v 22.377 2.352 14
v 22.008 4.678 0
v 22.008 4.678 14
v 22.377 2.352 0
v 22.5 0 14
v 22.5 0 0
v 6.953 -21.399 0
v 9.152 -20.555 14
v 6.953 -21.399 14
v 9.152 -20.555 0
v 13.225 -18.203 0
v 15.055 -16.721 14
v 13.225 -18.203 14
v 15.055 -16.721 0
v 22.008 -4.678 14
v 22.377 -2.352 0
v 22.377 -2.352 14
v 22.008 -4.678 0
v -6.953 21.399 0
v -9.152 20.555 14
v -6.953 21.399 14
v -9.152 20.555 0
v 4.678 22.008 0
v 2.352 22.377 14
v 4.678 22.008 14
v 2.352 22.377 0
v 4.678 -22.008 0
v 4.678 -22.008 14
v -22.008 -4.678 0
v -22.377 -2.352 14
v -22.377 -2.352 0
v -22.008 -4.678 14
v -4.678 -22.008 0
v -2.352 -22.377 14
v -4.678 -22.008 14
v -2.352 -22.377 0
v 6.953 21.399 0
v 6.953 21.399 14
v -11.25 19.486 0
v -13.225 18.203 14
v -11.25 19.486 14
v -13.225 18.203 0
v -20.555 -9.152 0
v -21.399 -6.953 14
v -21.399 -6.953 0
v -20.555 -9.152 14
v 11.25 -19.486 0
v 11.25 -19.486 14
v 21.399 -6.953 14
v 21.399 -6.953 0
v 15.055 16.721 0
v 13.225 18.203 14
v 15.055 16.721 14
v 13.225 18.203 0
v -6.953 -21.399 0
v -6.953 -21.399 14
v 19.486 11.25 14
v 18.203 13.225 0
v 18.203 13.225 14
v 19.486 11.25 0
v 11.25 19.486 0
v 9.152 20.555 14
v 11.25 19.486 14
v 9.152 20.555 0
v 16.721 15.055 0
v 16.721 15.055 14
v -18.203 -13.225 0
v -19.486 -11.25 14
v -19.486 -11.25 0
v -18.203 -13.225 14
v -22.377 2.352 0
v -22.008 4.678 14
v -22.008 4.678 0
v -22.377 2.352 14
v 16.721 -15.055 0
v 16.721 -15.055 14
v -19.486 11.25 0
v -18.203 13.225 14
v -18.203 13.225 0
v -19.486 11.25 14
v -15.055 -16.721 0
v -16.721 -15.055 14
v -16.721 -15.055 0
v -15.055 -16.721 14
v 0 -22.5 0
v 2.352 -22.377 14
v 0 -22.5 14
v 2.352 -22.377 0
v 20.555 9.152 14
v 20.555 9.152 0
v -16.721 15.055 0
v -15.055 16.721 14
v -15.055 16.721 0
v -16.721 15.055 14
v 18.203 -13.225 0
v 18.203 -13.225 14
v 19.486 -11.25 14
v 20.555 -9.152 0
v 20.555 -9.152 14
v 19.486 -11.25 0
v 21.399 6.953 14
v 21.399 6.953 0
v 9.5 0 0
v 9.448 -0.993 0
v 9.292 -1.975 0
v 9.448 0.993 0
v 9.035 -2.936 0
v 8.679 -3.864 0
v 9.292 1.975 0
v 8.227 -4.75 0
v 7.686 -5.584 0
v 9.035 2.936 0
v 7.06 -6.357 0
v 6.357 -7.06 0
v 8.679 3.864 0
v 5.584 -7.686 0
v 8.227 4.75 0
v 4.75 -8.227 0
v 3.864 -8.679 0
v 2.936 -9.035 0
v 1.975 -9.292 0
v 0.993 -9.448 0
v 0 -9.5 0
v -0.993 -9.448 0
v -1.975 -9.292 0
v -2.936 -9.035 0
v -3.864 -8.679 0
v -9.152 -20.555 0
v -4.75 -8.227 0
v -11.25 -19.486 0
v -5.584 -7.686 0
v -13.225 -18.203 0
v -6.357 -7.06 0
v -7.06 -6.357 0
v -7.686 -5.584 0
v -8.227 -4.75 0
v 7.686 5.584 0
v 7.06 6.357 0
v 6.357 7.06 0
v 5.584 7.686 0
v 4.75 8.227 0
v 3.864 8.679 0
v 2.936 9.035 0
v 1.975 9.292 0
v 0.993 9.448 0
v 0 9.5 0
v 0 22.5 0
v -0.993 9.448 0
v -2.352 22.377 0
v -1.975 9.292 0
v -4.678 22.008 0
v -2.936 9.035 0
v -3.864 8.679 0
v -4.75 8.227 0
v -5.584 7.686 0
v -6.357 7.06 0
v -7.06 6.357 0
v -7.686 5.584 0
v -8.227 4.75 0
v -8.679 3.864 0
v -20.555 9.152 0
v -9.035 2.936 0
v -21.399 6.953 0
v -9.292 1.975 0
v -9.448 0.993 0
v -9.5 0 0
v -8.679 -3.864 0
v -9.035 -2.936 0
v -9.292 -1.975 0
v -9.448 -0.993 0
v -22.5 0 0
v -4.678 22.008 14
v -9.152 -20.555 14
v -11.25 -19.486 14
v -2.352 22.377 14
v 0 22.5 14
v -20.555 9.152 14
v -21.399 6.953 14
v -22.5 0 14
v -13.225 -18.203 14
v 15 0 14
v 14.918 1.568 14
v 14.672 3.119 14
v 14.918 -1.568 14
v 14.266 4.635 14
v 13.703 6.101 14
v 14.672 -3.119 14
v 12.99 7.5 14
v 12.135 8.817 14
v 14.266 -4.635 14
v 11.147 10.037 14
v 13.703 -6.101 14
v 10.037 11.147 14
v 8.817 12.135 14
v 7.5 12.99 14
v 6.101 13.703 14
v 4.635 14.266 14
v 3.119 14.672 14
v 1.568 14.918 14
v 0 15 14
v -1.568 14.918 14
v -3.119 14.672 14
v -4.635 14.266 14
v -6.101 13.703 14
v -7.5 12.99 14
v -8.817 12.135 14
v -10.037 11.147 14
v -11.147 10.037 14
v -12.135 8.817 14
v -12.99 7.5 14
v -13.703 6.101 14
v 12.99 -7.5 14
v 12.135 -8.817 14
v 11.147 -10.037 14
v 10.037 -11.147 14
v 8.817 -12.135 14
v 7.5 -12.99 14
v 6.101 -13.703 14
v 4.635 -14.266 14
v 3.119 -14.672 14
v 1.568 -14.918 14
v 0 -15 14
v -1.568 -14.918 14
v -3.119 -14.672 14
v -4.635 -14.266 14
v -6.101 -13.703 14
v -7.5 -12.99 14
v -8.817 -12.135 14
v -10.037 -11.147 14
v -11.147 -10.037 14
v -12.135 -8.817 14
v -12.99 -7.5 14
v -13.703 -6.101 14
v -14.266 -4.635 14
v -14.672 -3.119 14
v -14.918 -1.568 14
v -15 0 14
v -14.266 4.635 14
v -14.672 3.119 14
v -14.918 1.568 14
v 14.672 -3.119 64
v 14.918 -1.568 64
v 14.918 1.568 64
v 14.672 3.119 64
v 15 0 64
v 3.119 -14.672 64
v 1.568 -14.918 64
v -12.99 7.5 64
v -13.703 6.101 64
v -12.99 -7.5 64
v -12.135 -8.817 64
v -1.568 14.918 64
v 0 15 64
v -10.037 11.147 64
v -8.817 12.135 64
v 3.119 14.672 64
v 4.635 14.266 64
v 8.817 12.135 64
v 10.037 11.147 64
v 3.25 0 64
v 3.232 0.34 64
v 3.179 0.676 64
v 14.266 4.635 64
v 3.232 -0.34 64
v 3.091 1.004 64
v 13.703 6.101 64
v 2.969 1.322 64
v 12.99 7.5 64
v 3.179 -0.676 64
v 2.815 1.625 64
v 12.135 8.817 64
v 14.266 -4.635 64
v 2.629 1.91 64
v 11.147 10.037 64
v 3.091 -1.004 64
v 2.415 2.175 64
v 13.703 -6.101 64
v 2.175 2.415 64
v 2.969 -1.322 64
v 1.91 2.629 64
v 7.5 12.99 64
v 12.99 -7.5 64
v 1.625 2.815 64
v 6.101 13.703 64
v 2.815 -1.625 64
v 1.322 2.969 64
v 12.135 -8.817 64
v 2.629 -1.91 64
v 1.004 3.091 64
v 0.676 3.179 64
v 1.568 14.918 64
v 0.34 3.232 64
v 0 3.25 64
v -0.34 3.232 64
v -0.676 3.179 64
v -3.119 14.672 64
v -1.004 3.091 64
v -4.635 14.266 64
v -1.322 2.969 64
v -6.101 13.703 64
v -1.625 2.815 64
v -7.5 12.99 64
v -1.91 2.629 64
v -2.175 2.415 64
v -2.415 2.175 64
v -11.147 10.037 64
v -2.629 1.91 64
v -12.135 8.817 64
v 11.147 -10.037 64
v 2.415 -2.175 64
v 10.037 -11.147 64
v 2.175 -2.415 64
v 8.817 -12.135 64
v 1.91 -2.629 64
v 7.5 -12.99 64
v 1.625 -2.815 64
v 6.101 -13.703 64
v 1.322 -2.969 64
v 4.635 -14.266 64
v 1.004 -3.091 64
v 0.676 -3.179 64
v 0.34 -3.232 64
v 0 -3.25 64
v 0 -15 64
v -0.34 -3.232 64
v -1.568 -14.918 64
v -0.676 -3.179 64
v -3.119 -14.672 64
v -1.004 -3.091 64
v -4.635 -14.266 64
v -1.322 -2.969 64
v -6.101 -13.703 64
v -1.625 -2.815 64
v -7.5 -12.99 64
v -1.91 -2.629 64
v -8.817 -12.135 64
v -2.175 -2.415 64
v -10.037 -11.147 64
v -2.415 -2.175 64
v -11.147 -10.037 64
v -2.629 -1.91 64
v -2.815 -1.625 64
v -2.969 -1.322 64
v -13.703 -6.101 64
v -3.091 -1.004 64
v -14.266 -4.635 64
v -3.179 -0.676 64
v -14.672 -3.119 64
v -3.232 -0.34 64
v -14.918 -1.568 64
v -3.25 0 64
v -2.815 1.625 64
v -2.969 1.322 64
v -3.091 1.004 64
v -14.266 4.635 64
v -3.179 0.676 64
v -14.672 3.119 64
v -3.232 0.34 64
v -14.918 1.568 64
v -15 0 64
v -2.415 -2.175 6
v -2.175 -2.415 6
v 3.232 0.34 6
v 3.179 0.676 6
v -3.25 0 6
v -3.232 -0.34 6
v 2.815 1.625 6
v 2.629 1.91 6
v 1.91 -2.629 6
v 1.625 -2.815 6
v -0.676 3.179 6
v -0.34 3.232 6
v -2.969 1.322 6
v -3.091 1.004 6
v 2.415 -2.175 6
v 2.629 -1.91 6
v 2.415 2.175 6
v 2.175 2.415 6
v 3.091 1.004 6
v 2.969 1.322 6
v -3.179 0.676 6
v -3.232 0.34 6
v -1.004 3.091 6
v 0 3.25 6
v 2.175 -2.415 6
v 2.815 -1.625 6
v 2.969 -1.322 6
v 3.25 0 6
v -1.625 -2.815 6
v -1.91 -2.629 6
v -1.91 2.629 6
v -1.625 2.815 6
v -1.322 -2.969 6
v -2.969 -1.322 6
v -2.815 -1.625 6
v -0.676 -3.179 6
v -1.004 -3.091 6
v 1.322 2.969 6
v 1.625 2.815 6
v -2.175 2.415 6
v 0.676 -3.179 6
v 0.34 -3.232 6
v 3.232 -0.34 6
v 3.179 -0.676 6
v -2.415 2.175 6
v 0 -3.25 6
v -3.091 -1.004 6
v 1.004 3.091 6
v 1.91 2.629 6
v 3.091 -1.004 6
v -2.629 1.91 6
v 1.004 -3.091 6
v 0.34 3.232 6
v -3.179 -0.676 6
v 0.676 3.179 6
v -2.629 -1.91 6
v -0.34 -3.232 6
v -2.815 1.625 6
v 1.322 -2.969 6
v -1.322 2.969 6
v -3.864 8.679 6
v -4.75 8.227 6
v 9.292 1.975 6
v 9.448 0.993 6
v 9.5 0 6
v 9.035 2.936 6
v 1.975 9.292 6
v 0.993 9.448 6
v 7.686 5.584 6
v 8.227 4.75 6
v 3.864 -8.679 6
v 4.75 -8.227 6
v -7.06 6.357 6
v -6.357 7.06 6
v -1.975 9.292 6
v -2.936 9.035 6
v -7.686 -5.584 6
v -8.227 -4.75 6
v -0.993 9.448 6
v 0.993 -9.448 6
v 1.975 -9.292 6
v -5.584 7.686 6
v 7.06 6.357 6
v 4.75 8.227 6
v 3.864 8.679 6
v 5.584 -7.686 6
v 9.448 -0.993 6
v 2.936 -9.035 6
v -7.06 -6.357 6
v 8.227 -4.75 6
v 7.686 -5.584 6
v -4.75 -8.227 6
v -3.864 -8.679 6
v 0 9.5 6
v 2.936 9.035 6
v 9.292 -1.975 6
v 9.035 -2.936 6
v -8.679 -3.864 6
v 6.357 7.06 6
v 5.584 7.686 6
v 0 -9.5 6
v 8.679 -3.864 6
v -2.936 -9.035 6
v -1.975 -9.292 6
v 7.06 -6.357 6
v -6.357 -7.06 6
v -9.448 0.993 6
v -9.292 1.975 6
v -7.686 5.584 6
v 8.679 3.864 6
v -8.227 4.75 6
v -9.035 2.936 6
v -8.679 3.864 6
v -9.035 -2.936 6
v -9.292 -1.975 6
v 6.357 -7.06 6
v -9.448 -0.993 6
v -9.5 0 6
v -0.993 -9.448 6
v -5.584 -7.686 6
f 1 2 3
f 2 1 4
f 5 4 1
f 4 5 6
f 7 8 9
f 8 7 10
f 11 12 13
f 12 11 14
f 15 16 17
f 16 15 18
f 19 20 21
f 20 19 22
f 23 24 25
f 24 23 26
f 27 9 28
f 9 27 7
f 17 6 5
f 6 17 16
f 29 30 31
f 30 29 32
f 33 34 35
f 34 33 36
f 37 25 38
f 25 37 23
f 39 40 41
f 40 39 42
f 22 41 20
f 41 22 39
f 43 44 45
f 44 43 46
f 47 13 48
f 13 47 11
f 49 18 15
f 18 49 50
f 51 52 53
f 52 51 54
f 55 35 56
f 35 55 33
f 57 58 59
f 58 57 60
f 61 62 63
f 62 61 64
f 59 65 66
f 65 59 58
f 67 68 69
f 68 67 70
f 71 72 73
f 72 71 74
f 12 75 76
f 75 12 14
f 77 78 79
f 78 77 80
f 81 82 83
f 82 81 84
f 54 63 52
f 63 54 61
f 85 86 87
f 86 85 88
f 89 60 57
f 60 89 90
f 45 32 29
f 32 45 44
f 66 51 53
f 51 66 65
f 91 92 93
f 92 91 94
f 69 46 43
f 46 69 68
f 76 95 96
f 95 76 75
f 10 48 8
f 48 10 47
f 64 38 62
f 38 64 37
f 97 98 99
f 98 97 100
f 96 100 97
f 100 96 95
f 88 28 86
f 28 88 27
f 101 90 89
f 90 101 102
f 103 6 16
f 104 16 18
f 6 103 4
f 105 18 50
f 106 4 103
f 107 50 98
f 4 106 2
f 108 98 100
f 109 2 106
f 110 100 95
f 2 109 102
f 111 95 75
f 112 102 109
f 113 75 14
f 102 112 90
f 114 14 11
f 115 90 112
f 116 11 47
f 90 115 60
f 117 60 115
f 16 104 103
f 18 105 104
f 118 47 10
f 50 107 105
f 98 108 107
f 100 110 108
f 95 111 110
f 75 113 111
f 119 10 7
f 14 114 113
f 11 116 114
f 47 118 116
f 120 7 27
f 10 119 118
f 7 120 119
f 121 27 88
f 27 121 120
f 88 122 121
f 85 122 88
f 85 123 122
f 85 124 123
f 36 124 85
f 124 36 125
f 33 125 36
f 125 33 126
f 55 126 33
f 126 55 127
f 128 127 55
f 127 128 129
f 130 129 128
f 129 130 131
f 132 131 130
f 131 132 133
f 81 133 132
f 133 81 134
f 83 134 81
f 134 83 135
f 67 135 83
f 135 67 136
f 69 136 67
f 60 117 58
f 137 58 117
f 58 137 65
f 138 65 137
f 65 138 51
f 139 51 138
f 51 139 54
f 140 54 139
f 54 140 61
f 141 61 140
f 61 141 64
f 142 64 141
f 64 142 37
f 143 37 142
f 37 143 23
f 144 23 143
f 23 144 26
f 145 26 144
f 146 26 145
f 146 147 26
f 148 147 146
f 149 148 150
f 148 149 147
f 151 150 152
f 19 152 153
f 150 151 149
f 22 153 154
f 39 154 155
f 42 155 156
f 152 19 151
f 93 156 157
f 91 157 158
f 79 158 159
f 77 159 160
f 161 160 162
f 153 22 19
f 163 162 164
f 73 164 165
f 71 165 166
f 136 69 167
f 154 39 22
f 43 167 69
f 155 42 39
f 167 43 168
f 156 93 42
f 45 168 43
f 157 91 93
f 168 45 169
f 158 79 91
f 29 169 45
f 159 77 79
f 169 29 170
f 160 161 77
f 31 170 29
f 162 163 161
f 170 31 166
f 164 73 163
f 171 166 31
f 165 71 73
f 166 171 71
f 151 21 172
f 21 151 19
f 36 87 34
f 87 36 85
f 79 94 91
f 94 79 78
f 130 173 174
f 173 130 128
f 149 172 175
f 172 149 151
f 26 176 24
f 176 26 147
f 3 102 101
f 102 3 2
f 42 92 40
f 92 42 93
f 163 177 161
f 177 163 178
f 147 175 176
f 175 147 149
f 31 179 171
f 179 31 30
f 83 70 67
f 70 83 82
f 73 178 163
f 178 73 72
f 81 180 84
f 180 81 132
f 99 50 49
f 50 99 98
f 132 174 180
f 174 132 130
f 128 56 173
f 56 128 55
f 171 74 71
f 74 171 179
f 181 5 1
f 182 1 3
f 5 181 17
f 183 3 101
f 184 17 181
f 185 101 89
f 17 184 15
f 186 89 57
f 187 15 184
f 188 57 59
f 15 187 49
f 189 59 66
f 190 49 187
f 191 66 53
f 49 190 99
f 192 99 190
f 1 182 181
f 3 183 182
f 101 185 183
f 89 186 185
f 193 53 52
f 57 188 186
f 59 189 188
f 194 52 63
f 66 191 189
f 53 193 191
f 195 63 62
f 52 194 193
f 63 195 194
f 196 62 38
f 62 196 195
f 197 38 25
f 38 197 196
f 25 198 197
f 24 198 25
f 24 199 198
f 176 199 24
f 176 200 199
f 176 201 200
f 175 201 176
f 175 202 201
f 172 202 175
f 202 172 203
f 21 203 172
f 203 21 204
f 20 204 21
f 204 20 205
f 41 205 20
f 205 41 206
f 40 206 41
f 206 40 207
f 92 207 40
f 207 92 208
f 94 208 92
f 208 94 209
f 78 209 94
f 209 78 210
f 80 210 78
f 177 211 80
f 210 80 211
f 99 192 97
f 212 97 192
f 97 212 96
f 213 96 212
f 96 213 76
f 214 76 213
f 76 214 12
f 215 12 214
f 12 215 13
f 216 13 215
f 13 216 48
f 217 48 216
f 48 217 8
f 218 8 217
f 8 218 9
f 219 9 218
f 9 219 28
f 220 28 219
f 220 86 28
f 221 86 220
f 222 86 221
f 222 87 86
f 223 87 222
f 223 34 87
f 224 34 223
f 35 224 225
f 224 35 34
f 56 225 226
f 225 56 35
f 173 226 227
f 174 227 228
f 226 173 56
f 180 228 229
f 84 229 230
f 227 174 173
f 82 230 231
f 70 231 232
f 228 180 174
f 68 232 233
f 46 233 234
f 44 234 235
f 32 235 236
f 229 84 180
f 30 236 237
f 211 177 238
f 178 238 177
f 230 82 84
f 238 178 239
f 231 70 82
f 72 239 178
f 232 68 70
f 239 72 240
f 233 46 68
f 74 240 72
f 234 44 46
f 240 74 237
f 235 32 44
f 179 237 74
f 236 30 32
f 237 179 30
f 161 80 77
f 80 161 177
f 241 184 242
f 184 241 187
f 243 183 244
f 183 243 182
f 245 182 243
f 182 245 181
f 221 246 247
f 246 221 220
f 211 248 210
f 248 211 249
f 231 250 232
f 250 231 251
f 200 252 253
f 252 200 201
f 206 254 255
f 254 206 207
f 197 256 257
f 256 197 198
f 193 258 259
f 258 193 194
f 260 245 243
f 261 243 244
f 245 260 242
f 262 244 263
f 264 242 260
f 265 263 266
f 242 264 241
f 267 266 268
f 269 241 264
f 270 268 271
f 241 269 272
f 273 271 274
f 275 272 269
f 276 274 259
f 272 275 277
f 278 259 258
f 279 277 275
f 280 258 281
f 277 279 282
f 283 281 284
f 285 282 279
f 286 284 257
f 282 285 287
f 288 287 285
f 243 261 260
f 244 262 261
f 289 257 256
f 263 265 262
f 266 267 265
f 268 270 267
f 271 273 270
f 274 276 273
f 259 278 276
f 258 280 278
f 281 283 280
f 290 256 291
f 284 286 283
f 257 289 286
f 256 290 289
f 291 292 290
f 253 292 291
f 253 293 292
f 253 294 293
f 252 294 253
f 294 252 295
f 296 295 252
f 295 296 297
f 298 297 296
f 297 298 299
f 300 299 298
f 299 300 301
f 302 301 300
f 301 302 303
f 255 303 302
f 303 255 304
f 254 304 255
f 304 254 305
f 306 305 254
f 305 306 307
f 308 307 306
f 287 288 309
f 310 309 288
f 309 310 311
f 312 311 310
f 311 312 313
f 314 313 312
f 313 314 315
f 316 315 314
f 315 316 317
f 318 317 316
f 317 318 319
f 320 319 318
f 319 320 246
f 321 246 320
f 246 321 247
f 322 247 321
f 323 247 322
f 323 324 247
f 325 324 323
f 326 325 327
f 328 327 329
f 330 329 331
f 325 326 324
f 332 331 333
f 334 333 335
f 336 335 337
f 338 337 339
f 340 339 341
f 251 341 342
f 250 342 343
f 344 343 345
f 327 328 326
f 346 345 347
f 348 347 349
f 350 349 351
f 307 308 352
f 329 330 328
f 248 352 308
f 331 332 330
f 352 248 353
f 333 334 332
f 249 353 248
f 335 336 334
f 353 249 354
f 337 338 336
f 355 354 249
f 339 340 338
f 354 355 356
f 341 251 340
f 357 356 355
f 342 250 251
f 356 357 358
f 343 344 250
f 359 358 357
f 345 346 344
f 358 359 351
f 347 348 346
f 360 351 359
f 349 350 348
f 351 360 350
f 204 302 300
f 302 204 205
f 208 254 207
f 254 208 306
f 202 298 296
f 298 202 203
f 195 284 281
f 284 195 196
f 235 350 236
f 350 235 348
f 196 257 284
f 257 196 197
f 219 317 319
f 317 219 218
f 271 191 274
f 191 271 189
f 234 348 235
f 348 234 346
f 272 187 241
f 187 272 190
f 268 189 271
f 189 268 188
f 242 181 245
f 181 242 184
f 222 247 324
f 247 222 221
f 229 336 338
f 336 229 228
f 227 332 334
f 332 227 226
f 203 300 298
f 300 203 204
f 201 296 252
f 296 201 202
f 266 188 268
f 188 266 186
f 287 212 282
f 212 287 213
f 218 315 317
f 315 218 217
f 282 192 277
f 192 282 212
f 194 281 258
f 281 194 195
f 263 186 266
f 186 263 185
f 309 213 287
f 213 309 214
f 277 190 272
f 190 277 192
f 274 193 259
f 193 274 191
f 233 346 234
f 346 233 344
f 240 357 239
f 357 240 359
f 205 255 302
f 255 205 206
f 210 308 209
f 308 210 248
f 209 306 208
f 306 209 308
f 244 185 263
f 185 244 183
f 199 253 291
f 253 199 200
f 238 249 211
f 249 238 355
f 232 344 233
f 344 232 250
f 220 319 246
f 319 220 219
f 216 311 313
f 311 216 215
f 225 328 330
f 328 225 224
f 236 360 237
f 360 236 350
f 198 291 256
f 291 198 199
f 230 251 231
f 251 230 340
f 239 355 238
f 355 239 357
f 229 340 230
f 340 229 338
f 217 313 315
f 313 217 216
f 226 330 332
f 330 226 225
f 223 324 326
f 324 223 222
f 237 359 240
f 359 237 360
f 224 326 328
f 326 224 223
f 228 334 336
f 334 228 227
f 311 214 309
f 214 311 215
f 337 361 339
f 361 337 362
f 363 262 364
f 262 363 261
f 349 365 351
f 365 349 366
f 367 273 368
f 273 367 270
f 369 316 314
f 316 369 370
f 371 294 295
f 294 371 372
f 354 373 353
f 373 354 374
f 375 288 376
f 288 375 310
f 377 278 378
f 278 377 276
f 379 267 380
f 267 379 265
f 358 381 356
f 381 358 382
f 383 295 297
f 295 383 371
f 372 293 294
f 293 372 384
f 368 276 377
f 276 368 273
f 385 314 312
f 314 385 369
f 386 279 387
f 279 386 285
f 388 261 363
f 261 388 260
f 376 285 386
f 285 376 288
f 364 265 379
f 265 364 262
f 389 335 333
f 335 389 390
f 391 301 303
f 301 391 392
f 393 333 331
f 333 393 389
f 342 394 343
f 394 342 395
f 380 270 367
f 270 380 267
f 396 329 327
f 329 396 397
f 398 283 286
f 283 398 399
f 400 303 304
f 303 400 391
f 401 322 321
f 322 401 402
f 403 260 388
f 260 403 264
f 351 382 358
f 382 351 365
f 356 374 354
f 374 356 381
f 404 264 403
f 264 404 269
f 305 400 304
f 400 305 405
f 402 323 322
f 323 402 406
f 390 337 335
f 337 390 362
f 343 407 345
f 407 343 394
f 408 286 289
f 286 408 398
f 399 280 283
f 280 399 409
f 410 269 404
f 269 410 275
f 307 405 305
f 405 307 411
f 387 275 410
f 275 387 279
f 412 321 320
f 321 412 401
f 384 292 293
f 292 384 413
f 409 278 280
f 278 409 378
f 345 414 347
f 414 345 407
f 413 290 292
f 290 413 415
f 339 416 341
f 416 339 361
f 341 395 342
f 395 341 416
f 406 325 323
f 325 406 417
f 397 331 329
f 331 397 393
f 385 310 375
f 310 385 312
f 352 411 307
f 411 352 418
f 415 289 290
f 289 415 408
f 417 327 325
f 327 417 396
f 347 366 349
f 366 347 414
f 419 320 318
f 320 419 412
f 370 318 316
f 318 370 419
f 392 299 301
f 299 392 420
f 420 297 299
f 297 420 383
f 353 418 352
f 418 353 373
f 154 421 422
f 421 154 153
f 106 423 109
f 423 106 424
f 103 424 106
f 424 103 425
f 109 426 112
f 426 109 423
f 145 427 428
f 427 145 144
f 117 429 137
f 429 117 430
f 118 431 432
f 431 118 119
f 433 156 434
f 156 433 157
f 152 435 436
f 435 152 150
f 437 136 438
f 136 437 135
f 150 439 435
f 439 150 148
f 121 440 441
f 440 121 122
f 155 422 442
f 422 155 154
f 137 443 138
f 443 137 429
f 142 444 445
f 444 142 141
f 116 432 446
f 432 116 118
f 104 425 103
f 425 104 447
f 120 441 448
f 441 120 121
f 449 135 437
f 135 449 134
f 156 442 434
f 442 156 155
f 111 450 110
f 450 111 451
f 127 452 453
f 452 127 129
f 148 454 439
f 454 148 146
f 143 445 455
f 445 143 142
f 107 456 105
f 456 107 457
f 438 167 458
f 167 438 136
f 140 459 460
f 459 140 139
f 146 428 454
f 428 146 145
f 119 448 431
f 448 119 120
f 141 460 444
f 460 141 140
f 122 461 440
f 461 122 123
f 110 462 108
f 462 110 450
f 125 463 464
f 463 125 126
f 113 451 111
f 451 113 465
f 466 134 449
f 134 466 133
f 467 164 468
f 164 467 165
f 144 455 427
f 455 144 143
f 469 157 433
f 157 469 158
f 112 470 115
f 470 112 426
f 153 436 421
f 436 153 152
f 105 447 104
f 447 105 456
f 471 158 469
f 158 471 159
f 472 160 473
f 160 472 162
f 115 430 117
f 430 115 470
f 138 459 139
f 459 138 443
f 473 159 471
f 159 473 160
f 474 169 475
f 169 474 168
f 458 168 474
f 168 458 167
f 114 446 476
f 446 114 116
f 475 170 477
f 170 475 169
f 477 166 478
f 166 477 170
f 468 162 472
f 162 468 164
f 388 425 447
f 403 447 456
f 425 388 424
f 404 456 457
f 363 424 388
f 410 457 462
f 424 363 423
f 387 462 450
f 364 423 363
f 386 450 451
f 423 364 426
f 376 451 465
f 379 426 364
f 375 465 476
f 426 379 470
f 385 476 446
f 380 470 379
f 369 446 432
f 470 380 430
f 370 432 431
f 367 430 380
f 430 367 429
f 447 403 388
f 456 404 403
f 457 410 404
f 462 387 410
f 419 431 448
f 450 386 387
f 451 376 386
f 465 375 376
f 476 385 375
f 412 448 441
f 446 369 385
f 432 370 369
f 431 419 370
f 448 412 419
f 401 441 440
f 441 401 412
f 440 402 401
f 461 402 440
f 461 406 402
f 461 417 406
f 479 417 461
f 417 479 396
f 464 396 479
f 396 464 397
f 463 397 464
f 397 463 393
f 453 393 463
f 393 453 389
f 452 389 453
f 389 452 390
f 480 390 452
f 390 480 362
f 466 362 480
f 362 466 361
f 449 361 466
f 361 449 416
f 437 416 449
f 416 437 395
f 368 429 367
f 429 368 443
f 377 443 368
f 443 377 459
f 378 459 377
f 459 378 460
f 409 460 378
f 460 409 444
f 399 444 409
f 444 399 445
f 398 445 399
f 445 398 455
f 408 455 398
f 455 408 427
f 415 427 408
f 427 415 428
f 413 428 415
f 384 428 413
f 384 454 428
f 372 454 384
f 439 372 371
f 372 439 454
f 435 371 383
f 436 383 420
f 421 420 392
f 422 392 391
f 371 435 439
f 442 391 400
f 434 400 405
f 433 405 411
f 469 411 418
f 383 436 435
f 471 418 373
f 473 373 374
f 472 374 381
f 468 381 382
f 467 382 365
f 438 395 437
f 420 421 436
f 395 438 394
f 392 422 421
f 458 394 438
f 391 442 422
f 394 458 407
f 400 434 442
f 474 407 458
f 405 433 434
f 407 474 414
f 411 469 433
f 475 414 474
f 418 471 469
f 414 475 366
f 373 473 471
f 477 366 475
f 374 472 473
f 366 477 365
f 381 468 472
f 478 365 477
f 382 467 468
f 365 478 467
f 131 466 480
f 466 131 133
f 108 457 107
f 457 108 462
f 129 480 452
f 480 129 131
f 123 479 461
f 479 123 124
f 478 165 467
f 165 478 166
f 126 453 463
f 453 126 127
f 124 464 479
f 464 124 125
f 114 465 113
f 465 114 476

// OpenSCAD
$fa=6;
$fs=0.1;
EPS=0.01;
BaseHeight=14;
InnerHeight=50;
MetalRodRadius=6.5/2;

BearingR=19/2;
BearingHeight=6;

difference() {
    union() {
        cylinder(r=45/2, h=BaseHeight);
        translate([0,0,BaseHeight]) cylinder(r=15,h=InnerHeight);
    }
    translate([0,0,-EPS]) cylinder(r=MetalRodRadius, h=BaseHeight+InnerHeight+2*EPS);
    translate([0,0,-EPS]) cylinder(r=BearingR, h=BearingHeight+EPS);
}
